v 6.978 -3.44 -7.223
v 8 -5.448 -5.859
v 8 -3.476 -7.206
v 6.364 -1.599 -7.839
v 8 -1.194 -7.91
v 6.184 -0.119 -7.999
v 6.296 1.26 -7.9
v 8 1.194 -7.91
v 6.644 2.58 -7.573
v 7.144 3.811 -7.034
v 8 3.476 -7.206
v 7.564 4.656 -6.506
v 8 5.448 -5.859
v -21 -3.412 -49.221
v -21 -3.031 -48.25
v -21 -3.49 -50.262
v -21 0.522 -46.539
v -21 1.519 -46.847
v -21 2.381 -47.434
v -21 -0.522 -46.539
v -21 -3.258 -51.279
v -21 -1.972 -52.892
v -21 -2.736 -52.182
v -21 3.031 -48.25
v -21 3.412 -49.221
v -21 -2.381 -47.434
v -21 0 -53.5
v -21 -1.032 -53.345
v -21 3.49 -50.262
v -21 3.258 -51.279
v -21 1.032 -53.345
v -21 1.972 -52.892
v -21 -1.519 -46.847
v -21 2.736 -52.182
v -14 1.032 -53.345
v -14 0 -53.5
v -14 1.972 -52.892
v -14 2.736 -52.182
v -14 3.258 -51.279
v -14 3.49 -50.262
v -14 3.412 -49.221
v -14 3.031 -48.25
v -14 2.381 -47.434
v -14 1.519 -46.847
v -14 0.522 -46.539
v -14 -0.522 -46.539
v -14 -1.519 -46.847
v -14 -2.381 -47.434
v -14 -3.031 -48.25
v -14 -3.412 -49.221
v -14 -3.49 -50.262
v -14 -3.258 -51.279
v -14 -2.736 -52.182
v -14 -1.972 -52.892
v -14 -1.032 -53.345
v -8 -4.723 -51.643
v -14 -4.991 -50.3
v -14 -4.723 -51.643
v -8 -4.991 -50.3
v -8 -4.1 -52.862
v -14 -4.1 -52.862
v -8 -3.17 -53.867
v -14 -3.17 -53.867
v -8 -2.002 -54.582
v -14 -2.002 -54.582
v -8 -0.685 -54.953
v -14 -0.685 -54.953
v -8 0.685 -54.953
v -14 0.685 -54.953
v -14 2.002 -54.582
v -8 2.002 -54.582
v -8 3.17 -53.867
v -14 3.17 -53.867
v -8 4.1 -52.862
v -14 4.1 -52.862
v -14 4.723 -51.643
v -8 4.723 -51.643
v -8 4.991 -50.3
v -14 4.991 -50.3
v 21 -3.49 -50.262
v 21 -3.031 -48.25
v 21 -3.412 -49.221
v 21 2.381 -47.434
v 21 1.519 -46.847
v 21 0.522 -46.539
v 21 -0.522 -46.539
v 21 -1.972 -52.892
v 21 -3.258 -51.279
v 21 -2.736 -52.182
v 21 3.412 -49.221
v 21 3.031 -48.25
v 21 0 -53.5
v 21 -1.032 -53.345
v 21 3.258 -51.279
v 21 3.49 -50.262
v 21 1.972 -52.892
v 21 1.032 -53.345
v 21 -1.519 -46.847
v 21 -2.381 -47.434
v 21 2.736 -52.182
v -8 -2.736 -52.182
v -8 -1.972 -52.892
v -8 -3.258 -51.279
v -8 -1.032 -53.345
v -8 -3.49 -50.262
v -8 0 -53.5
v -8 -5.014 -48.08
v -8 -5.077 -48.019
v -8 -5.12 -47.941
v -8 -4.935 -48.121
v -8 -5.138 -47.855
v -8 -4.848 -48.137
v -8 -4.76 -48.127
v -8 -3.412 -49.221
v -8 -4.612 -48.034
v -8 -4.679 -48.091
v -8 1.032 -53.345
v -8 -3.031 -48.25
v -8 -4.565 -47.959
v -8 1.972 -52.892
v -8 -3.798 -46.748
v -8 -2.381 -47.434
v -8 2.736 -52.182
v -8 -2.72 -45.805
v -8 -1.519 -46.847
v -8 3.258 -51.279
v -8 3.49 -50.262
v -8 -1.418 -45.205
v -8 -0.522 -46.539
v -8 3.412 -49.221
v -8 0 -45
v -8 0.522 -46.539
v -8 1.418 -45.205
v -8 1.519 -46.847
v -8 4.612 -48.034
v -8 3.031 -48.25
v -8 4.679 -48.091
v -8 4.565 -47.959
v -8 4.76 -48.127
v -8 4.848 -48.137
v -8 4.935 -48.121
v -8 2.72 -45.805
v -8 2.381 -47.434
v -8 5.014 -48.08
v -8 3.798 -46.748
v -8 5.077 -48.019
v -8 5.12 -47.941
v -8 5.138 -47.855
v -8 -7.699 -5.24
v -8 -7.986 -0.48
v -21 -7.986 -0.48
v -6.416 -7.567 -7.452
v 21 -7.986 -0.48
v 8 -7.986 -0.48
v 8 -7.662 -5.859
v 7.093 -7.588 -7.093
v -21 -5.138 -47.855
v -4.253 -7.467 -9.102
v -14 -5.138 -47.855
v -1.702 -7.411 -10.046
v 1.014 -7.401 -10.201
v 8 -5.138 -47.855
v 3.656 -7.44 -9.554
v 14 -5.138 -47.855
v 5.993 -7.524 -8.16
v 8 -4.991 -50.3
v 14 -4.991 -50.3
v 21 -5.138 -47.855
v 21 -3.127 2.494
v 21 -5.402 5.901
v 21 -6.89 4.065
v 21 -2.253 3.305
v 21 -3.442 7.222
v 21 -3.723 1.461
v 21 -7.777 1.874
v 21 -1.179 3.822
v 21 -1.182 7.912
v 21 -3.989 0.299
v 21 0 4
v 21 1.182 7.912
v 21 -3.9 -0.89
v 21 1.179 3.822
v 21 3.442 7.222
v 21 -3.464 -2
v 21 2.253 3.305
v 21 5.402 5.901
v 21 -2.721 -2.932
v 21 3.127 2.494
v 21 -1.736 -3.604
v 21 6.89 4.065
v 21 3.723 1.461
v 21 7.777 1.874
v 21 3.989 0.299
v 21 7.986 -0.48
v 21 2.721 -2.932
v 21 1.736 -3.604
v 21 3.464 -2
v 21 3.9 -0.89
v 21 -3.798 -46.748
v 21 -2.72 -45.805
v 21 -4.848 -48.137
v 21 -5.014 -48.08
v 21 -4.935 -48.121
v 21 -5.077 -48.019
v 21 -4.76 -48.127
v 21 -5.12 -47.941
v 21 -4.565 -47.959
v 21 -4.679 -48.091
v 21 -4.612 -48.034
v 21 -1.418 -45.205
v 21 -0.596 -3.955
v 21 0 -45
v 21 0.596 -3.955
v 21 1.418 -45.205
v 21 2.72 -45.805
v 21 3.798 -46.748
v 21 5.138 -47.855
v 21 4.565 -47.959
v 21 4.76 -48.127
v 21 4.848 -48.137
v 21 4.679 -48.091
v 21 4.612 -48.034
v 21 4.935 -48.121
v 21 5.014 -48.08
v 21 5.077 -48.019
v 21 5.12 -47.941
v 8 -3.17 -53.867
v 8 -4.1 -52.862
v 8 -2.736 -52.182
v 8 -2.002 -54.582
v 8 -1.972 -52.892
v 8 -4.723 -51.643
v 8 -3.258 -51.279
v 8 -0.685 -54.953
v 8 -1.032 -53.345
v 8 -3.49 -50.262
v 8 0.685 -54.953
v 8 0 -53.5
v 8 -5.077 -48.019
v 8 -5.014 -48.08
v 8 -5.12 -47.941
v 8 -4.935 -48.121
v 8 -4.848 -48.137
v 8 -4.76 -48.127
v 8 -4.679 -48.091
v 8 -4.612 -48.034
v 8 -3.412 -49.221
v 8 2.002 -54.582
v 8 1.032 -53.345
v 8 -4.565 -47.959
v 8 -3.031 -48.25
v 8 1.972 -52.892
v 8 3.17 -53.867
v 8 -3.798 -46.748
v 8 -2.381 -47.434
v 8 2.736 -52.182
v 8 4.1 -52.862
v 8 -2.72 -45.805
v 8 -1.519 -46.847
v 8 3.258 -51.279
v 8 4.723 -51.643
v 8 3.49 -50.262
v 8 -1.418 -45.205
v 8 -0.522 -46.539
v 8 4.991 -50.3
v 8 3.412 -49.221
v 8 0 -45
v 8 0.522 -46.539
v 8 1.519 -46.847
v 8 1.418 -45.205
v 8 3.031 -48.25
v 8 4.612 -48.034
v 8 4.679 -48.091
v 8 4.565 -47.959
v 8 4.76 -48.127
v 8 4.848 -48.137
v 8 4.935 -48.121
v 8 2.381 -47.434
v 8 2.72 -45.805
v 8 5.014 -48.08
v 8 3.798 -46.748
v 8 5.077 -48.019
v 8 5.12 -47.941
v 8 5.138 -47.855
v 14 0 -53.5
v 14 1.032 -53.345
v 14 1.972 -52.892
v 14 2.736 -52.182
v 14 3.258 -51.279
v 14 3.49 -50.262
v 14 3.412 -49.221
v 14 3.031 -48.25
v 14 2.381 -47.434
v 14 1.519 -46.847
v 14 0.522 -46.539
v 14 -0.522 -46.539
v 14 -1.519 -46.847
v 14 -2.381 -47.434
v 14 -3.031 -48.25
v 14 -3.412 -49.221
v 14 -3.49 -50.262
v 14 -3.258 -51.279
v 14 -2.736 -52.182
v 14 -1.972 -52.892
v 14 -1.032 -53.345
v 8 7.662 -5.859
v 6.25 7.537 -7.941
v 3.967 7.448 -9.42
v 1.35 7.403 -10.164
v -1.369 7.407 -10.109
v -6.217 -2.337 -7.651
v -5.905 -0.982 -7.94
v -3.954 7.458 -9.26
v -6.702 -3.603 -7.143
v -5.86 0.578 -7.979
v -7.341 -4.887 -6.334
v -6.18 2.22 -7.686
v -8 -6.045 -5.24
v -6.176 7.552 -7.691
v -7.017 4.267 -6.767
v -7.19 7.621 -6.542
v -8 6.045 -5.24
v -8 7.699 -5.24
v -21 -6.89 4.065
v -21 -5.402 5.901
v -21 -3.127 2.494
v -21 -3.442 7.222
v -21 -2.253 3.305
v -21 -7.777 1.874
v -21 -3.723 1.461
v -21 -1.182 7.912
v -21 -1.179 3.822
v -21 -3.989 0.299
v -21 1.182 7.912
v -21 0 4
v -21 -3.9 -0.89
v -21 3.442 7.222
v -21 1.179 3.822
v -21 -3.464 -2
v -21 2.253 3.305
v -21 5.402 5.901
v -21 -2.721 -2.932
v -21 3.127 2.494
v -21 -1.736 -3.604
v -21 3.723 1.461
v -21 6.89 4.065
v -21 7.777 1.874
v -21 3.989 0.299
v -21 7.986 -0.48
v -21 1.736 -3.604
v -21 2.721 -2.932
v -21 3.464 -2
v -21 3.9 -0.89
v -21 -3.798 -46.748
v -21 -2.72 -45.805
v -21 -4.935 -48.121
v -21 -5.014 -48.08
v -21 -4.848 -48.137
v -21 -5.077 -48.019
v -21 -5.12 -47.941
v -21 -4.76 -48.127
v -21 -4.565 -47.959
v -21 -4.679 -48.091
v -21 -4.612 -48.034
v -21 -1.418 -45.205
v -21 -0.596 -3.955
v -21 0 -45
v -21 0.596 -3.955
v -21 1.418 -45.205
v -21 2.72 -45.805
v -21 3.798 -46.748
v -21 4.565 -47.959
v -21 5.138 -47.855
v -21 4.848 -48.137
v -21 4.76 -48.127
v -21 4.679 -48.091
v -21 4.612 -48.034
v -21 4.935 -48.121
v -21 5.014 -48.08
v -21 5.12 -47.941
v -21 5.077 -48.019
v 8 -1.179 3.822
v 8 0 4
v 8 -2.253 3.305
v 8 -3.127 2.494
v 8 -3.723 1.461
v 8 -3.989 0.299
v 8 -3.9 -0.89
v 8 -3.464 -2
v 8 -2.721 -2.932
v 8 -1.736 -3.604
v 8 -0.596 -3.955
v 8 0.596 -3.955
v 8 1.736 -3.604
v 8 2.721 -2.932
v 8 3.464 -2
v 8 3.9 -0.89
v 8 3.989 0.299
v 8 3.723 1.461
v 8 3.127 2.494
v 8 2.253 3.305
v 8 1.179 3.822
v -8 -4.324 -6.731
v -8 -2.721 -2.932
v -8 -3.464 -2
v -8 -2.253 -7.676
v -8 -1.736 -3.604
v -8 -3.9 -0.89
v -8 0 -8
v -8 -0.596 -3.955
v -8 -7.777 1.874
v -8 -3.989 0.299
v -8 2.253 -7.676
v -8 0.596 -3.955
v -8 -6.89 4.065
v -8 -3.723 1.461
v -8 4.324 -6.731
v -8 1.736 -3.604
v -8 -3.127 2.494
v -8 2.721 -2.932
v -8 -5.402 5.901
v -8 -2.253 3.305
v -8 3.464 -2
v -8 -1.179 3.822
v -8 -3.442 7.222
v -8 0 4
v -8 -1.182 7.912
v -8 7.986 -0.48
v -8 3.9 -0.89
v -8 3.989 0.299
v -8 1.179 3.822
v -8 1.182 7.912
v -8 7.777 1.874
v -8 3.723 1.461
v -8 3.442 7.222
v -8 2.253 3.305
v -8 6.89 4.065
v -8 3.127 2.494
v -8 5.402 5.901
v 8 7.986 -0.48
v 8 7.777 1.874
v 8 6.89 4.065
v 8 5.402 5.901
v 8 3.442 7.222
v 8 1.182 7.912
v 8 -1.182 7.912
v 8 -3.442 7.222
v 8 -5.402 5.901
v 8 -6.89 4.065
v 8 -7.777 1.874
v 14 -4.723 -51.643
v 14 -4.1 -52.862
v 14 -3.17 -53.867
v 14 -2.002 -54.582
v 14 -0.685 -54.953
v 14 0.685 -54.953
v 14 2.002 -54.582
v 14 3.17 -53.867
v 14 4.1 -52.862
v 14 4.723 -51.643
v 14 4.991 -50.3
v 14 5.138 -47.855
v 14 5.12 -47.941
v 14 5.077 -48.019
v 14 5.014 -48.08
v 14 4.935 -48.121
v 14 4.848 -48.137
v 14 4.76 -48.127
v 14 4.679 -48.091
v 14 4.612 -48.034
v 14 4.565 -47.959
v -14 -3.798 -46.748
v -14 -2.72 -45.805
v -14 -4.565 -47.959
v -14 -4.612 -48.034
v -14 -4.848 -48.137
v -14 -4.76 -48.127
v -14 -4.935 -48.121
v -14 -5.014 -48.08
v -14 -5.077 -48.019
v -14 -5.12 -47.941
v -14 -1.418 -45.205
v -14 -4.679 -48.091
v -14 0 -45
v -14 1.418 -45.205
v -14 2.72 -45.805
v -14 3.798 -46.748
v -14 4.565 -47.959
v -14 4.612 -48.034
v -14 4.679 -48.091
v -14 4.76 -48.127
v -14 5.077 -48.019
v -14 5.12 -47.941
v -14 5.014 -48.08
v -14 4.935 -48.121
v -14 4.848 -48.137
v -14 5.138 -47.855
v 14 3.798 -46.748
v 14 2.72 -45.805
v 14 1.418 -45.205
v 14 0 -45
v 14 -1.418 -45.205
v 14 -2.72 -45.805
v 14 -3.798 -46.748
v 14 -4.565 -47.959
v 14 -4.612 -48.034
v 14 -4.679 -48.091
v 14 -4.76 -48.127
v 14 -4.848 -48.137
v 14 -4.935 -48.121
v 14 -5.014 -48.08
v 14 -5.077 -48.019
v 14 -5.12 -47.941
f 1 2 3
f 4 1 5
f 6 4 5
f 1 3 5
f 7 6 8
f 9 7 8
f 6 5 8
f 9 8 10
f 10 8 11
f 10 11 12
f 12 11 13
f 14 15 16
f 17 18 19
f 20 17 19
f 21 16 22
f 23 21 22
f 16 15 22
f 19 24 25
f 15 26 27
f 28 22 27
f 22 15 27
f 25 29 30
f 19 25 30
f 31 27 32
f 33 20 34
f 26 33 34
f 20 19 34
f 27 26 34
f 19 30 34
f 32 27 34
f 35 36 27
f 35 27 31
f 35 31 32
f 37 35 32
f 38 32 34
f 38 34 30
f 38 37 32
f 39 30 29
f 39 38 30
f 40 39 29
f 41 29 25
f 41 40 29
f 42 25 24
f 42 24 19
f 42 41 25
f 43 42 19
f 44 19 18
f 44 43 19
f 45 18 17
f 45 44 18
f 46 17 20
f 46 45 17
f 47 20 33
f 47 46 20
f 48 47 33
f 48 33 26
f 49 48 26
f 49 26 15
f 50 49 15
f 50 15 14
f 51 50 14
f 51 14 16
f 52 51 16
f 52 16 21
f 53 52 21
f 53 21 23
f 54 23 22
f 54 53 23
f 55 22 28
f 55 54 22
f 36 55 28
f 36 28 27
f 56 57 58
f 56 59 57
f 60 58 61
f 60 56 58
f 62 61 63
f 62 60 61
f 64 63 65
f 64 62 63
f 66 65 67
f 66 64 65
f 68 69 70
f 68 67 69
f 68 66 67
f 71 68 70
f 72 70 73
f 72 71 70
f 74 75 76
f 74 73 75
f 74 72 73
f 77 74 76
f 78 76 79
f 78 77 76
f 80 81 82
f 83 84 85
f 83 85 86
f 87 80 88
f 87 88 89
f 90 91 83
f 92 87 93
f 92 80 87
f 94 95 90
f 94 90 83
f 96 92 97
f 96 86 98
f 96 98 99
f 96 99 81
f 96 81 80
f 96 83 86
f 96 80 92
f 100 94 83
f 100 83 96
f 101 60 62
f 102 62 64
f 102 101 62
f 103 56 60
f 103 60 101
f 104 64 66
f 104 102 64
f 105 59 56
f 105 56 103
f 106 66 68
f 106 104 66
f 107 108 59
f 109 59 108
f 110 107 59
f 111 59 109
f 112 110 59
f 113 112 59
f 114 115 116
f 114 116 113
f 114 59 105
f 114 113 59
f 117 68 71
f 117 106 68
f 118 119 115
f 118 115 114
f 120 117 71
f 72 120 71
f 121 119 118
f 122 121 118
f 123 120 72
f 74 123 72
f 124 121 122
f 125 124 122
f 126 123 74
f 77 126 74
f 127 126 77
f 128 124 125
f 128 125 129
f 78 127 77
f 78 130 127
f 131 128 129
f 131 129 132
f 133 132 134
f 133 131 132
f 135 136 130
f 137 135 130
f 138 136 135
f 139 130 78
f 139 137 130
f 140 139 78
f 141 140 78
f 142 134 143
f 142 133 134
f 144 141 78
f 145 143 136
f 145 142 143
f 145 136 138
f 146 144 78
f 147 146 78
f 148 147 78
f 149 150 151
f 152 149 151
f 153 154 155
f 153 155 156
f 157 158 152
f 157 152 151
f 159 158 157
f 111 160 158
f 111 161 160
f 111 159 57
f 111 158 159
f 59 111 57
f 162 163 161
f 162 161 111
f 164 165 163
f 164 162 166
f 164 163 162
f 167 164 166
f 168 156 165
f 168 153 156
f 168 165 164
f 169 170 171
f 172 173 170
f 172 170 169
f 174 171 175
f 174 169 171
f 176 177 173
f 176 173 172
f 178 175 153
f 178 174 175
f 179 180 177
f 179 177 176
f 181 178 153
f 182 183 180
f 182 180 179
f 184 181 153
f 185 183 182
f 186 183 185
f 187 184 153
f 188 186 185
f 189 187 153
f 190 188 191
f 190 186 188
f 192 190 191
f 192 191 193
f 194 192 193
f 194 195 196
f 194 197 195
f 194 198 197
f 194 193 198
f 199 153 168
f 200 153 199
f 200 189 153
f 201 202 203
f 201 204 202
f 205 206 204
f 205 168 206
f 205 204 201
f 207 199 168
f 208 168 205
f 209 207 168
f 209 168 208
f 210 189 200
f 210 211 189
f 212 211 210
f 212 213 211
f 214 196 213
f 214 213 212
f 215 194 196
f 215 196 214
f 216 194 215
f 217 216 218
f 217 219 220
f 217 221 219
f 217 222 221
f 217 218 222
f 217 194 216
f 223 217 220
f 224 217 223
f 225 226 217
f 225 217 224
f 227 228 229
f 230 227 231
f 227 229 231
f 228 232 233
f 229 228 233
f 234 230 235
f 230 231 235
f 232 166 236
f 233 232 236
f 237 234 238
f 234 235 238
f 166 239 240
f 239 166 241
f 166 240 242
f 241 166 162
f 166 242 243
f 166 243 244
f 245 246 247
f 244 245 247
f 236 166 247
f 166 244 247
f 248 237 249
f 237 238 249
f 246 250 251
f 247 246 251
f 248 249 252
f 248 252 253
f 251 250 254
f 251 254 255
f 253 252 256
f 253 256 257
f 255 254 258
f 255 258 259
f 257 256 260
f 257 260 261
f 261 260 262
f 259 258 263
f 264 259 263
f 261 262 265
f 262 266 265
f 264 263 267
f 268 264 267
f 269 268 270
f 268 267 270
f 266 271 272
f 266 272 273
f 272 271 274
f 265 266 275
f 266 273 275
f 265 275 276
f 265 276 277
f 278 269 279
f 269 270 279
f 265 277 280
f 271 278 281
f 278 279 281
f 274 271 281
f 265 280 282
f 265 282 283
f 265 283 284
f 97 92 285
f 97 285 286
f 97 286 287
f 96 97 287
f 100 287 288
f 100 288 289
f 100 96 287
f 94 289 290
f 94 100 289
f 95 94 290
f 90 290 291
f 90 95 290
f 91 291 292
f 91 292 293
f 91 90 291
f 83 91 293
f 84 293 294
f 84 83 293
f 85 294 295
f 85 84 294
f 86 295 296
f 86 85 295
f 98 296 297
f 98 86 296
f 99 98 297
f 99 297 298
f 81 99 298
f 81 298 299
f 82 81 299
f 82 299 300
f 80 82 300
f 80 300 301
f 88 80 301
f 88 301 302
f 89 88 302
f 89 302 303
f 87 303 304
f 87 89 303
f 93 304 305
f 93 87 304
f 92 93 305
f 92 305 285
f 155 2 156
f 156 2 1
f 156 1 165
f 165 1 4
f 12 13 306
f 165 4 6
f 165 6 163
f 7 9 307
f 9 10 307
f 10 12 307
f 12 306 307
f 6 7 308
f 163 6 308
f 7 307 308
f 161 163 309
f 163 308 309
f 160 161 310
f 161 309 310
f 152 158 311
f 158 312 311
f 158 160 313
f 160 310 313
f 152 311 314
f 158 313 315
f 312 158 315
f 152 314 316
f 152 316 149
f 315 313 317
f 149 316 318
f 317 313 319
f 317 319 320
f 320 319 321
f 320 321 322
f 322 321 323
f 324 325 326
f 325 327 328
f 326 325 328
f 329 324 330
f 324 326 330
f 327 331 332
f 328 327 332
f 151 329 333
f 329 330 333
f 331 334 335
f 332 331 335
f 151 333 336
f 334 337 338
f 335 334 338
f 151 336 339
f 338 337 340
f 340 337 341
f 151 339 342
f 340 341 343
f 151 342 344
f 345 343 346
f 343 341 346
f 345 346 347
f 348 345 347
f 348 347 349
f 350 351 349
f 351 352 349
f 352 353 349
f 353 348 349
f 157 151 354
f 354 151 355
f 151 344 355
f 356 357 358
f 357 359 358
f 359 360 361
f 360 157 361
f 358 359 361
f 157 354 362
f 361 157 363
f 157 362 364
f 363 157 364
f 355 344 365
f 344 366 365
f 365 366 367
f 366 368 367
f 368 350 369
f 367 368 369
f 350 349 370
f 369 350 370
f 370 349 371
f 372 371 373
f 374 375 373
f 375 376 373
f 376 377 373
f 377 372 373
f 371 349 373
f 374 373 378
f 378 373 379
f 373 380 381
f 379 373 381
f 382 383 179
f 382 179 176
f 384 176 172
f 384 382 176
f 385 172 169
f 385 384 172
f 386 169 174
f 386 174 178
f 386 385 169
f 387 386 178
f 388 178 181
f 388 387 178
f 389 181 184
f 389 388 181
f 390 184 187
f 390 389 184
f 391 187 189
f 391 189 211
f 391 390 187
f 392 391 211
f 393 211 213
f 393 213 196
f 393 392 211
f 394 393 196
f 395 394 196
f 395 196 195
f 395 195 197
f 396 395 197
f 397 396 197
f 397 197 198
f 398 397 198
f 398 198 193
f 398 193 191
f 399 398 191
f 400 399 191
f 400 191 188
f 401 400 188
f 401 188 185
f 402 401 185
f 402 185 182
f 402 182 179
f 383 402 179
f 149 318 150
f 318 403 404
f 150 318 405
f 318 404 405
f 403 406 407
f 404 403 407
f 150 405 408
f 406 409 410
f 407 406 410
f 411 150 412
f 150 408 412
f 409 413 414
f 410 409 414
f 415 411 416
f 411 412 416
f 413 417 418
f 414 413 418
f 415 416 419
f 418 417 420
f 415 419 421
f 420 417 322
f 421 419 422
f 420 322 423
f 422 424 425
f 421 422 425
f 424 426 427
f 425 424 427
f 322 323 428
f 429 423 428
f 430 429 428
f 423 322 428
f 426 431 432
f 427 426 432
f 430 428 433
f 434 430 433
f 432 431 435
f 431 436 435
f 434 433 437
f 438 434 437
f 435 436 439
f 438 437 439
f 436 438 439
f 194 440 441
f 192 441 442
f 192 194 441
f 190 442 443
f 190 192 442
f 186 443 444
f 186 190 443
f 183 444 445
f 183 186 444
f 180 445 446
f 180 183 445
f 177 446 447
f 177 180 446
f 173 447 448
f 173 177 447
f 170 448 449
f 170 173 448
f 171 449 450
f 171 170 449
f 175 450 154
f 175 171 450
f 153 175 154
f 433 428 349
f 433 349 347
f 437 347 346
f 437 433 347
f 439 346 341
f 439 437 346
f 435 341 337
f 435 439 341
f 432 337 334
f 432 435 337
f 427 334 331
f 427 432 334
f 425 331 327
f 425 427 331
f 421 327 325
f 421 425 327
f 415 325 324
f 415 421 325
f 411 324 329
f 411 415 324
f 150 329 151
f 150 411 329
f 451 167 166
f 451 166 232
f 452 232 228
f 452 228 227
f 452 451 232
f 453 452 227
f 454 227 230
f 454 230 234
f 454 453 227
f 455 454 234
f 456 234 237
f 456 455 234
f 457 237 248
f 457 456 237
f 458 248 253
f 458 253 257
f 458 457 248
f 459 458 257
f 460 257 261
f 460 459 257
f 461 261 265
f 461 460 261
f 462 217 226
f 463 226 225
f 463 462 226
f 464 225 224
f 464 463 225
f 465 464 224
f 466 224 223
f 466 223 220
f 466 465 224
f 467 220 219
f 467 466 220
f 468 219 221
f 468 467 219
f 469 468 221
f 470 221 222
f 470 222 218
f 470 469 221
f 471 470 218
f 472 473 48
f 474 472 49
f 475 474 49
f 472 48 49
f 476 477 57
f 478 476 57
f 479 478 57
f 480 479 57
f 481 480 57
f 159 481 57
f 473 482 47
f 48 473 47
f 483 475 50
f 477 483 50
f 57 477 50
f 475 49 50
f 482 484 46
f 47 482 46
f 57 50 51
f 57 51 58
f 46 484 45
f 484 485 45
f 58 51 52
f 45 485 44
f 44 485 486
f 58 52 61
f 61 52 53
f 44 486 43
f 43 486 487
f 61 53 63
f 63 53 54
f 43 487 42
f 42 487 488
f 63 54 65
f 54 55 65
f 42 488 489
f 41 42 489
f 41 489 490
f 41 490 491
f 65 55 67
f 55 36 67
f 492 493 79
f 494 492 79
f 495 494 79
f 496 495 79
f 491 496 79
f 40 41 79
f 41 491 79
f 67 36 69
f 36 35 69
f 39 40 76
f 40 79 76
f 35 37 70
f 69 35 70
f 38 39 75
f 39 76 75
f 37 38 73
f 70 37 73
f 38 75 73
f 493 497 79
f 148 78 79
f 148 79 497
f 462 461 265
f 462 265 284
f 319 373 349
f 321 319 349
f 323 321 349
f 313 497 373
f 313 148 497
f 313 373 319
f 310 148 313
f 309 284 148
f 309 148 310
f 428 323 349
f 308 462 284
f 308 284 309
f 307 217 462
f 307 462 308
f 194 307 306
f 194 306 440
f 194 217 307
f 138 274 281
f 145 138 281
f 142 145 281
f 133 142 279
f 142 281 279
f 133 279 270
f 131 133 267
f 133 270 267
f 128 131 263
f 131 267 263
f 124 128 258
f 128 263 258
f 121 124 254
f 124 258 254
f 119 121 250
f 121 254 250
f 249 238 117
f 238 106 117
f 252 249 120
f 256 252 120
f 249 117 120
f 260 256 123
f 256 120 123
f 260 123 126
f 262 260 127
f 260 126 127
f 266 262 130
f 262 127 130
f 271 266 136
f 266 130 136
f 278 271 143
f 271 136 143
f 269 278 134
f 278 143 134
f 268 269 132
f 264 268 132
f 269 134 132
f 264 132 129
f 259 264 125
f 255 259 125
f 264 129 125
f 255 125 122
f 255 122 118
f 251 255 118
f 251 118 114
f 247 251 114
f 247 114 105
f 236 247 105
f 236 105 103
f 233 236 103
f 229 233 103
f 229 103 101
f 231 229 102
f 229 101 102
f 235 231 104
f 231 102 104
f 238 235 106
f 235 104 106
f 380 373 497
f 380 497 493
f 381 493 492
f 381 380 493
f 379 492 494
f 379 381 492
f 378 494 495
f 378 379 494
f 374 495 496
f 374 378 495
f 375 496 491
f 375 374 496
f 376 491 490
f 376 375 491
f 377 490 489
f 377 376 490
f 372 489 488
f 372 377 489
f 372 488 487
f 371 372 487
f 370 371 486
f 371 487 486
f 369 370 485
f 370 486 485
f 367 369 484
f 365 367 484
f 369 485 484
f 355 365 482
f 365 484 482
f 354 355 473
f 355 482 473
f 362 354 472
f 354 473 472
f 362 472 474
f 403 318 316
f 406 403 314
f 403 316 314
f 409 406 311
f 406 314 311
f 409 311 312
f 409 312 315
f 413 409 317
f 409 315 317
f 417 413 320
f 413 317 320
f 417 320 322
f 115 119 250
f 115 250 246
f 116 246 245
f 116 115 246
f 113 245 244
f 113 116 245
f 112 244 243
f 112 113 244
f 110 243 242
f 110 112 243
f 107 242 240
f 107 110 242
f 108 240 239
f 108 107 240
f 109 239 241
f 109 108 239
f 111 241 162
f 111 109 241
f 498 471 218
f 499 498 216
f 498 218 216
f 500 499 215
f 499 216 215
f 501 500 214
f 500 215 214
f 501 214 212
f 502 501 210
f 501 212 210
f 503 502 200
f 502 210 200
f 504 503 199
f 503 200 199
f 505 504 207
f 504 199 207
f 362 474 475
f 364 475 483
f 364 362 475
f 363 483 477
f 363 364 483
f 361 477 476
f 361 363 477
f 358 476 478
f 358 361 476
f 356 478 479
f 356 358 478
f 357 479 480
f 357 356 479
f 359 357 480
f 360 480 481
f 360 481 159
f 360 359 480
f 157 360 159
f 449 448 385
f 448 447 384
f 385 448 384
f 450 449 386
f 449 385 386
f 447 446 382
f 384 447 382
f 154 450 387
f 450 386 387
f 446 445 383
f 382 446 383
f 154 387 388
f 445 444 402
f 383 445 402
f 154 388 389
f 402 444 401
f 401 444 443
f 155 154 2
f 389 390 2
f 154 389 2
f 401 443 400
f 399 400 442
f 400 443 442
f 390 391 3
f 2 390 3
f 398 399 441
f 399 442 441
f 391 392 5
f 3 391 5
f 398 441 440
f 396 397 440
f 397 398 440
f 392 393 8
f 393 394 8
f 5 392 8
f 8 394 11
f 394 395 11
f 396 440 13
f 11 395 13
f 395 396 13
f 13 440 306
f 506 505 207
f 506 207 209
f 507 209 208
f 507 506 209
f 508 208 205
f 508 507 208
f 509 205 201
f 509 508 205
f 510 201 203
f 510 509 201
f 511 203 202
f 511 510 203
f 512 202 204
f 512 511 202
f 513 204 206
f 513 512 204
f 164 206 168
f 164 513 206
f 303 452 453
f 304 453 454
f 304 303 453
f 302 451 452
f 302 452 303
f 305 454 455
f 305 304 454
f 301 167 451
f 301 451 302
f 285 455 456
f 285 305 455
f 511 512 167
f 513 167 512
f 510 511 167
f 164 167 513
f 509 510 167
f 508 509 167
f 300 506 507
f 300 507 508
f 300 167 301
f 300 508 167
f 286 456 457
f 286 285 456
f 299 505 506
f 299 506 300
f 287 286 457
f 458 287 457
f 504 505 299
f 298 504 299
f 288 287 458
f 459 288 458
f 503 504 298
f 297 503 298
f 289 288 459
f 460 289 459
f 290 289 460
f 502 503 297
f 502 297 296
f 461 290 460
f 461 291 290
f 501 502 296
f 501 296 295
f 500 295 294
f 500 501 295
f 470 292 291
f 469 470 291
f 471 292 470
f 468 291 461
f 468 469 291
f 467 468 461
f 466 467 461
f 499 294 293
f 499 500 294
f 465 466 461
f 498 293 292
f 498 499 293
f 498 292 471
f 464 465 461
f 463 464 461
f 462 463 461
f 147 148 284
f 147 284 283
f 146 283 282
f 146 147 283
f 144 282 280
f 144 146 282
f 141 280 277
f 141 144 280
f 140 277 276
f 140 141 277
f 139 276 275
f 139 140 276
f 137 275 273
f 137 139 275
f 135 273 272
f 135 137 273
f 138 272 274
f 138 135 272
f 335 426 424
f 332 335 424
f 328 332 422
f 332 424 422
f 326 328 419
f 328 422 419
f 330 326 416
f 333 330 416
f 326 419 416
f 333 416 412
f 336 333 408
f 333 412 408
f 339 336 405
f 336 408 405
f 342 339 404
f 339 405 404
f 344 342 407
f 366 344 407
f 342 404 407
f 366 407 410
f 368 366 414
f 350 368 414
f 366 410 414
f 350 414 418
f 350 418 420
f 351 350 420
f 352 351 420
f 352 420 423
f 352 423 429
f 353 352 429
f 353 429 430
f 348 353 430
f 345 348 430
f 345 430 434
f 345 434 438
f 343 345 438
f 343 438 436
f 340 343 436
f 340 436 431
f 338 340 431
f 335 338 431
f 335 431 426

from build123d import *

# Parameters (mm, degrees)
SKETCH1_R           = 8
SKETCH1_R_2         = 4
SKETCH1_R_3         = 5
SKETCH1_R_4         = 3.5
BOSS_EXTRUDE1_DEPTH = 21
SKETCH1_4_R         = 8
SKETCH1_4_R_2       = 4
CUT_EXTRUDE1_DEPTH  = 8
SKETCH1_5_R         = 5
SKETCH1_5_R_2       = 3.5
CUT_EXTRUDE2_DEPTH  = 8
CUT_EXTRUDE3_START  = 21
SKETCH1_6_R         = 5
SKETCH1_6_R_2       = 3.5
CUT_EXTRUDE3_DEPTH  = 7
CUT_EXTRUDE4_START  = -14
SKETCH1_7_R         = 5
SKETCH1_7_R_2       = 3.5
CUT_EXTRUDE4_DEPTH  = 7
FILLET2_START       = -8
FILLET2_DEPTH       = 16
FILLET2_START_2     = -22
FILLET2_2_DEPTH     = 8
FILLET2_START_3     = 14
FILLET2_3_DEPTH     = 8
CUT_EXTRUDE5_DEPTH  = 10


with BuildPart() as part:
    # Sketch1 → Boss-Extrude1 (new, symmetric)
    # profile 1 of 4: a face of its own
    with BuildSketch(Plane(origin=(0, 0, 0), x_dir=(0, 0, -1), z_dir=(1, 0, 0))):
        with BuildLine():
            Line((50.3, 4.990991885), (0.48, 7.985587017))
            ThreePointArc((0.48, 7.985587017), (5.824087911, 5.48452368), (8, 0))
            ThreePointArc((8, 0), (5.824087911, -5.48452368), (0.48, -7.985587017))
            Line((0.48, -7.985587017), (50.3, -4.990991885))
            ThreePointArc((50.3, -4.990991885), (45, 0), (50.3, 4.990991885))
        make_face()
    # profile 2 of 4: a face of its own
    with BuildSketch(Plane(origin=(0, 0, 0), x_dir=(0, 0, -1), z_dir=(1, 0, 0))):
        Circle(SKETCH1_R)
        with Locations(Location((0, 0, 0), (0, 0, 180))):
            Circle(SKETCH1_R_2, mode=Mode.SUBTRACT)
    # profile 3 of 4: a face of its own
    with BuildSketch(Plane(origin=(0, 0, 0), x_dir=(0, 0, -1), z_dir=(1, 0, 0))):
        with Locations((50, 0)):
            Circle(SKETCH1_R_3)
        with Locations((50, 0)):
            Circle(SKETCH1_R_4, mode=Mode.SUBTRACT)
    # profile 4 of 4: a face of its own
    with BuildSketch(Plane(origin=(0, 0, 0), x_dir=(0, 0, -1), z_dir=(1, 0, 0))):
        with Locations((50, 0)):
            Circle(SKETCH1_R_4)
    extrude(amount=BOSS_EXTRUDE1_DEPTH, both=True)

    # Sketch1<4> → Cut-Extrude1 (cut, symmetric)
    with BuildSketch(Plane(origin=(0, 0, 0), x_dir=(0, 0, -1), z_dir=(1, 0, 0))):
        Circle(SKETCH1_4_R)
        with Locations(Location((0, 0, 0), (0, 0, 180))):
            Circle(SKETCH1_4_R_2, mode=Mode.SUBTRACT)
    extrude(amount=CUT_EXTRUDE1_DEPTH, both=True, mode=Mode.SUBTRACT)

    # Sketch1<5> → Cut-Extrude2 (cut, symmetric)
    with BuildSketch(Plane(origin=(0, 0, 0), x_dir=(0, 0, -1), z_dir=(1, 0, 0))):
        with Locations((50, 0)):
            Circle(SKETCH1_5_R)
        with Locations((50, 0)):
            Circle(SKETCH1_5_R_2, mode=Mode.SUBTRACT)
    extrude(amount=CUT_EXTRUDE2_DEPTH, both=True, mode=Mode.SUBTRACT)

    # Sketch1<6> → Cut-Extrude3 (cut)
    with BuildSketch(Plane(origin=(0, 0, 0), x_dir=(0, 0, -1), z_dir=(1, 0, 0)).offset(CUT_EXTRUDE3_START)):
        with Locations((50, 0)):
            Circle(SKETCH1_6_R)
        with Locations((50, 0)):
            Circle(SKETCH1_6_R_2, mode=Mode.SUBTRACT)
    extrude(amount=-CUT_EXTRUDE3_DEPTH, mode=Mode.SUBTRACT)

    # Sketch1<7> → Cut-Extrude4 (cut)
    with BuildSketch(Plane(origin=(0, 0, 0), x_dir=(0, 0, -1), z_dir=(1, 0, 0)).offset(CUT_EXTRUDE4_START)):
        with Locations((50, 0)):
            Circle(SKETCH1_7_R)
        with Locations((50, 0)):
            Circle(SKETCH1_7_R_2, mode=Mode.SUBTRACT)
    extrude(amount=-CUT_EXTRUDE4_DEPTH, mode=Mode.SUBTRACT)

    # Fillet2: read off the stored shape, not the designer's step
    # Fillet2 outline → Fillet2 (cut)
    with BuildSketch(Plane.YZ.offset(FILLET2_START)):
        with BuildLine():
            ThreePointArc((-4.990991885, -50.3), (-4.9190545, -49.10395155), (-4.564624299, -47.959361617))
            ThreePointArc((-4.564624299, -47.959361617), (-4.892264664, -48.132066584), (-5.13796127, -47.854923314))
            Line((-5.13796127, -47.854923314), (-4.990991885, -50.3))
        make_face()
        with BuildLine():
            ThreePointArc((5.13796127, -47.854923314), (4.892264664, -48.132066584), (4.564624299, -47.959361617))
            ThreePointArc((4.564624299, -47.959361617), (4.9190545, -49.10395155), (4.990991885, -50.3))
            Line((4.990991885, -50.3), (5.13796127, -47.854923314))
        make_face()
    extrude(amount=FILLET2_DEPTH, mode=Mode.SUBTRACT)

    # Fillet2 2 outline → Fillet2 2 (cut)
    with BuildSketch(Plane.YZ.offset(FILLET2_START_2)):
        with BuildLine():
            ThreePointArc((-4.990991885, -50.3), (-4.9190545, -49.10395155), (-4.564624299, -47.959361617))
            ThreePointArc((-4.564624299, -47.959361617), (-4.892264664, -48.132066584), (-5.13796127, -47.854923314))
            Line((-5.13796127, -47.854923314), (-4.990991885, -50.3))
        make_face()
        with BuildLine():
            ThreePointArc((5.13796127, -47.854923314), (4.892264664, -48.132066584), (4.564624299, -47.959361617))
            ThreePointArc((4.564624299, -47.959361617), (4.9190545, -49.10395155), (4.990991885, -50.3))
            Line((4.990991885, -50.3), (5.13796127, -47.854923314))
        make_face()
    extrude(amount=FILLET2_2_DEPTH, mode=Mode.SUBTRACT)

    # Fillet2 3 outline → Fillet2 3 (cut)
    with BuildSketch(Plane.YZ.offset(FILLET2_START_3)):
        with BuildLine():
            ThreePointArc((-4.990991885, -50.3), (-4.9190545, -49.10395155), (-4.564624299, -47.959361617))
            ThreePointArc((-4.564624299, -47.959361617), (-4.892264664, -48.132066584), (-5.13796127, -47.854923314))
            Line((-5.13796127, -47.854923314), (-4.990991885, -50.3))
        make_face()
        with BuildLine():
            ThreePointArc((5.13796127, -47.854923314), (4.892264664, -48.132066584), (4.564624299, -47.959361617))
            ThreePointArc((4.564624299, -47.959361617), (4.9190545, -49.10395155), (4.990991885, -50.3))
            Line((4.990991885, -50.3), (5.13796127, -47.854923314))
        make_face()
    extrude(amount=FILLET2_3_DEPTH, mode=Mode.SUBTRACT)

    # Sketch3 → Cut-Extrude5 (cut, symmetric)
    with BuildSketch(Plane(origin=(0, 0, 0), x_dir=(1, 0, 0), z_dir=(0, 1, 0))):
        with BuildLine():
            Line((-8, -3.76), (8, -3.76))
            Line((8, -3.76), (8, 5.858563907))
            ThreePointArc((8, 5.858563907), (-0.18107936, 10.23314684), (-8, 5.24))
            Line((-8, 5.24), (-8, -3.76))
        make_face()
    extrude(amount=CUT_EXTRUDE5_DEPTH, both=True, mode=Mode.SUBTRACT)


solid = part.part
